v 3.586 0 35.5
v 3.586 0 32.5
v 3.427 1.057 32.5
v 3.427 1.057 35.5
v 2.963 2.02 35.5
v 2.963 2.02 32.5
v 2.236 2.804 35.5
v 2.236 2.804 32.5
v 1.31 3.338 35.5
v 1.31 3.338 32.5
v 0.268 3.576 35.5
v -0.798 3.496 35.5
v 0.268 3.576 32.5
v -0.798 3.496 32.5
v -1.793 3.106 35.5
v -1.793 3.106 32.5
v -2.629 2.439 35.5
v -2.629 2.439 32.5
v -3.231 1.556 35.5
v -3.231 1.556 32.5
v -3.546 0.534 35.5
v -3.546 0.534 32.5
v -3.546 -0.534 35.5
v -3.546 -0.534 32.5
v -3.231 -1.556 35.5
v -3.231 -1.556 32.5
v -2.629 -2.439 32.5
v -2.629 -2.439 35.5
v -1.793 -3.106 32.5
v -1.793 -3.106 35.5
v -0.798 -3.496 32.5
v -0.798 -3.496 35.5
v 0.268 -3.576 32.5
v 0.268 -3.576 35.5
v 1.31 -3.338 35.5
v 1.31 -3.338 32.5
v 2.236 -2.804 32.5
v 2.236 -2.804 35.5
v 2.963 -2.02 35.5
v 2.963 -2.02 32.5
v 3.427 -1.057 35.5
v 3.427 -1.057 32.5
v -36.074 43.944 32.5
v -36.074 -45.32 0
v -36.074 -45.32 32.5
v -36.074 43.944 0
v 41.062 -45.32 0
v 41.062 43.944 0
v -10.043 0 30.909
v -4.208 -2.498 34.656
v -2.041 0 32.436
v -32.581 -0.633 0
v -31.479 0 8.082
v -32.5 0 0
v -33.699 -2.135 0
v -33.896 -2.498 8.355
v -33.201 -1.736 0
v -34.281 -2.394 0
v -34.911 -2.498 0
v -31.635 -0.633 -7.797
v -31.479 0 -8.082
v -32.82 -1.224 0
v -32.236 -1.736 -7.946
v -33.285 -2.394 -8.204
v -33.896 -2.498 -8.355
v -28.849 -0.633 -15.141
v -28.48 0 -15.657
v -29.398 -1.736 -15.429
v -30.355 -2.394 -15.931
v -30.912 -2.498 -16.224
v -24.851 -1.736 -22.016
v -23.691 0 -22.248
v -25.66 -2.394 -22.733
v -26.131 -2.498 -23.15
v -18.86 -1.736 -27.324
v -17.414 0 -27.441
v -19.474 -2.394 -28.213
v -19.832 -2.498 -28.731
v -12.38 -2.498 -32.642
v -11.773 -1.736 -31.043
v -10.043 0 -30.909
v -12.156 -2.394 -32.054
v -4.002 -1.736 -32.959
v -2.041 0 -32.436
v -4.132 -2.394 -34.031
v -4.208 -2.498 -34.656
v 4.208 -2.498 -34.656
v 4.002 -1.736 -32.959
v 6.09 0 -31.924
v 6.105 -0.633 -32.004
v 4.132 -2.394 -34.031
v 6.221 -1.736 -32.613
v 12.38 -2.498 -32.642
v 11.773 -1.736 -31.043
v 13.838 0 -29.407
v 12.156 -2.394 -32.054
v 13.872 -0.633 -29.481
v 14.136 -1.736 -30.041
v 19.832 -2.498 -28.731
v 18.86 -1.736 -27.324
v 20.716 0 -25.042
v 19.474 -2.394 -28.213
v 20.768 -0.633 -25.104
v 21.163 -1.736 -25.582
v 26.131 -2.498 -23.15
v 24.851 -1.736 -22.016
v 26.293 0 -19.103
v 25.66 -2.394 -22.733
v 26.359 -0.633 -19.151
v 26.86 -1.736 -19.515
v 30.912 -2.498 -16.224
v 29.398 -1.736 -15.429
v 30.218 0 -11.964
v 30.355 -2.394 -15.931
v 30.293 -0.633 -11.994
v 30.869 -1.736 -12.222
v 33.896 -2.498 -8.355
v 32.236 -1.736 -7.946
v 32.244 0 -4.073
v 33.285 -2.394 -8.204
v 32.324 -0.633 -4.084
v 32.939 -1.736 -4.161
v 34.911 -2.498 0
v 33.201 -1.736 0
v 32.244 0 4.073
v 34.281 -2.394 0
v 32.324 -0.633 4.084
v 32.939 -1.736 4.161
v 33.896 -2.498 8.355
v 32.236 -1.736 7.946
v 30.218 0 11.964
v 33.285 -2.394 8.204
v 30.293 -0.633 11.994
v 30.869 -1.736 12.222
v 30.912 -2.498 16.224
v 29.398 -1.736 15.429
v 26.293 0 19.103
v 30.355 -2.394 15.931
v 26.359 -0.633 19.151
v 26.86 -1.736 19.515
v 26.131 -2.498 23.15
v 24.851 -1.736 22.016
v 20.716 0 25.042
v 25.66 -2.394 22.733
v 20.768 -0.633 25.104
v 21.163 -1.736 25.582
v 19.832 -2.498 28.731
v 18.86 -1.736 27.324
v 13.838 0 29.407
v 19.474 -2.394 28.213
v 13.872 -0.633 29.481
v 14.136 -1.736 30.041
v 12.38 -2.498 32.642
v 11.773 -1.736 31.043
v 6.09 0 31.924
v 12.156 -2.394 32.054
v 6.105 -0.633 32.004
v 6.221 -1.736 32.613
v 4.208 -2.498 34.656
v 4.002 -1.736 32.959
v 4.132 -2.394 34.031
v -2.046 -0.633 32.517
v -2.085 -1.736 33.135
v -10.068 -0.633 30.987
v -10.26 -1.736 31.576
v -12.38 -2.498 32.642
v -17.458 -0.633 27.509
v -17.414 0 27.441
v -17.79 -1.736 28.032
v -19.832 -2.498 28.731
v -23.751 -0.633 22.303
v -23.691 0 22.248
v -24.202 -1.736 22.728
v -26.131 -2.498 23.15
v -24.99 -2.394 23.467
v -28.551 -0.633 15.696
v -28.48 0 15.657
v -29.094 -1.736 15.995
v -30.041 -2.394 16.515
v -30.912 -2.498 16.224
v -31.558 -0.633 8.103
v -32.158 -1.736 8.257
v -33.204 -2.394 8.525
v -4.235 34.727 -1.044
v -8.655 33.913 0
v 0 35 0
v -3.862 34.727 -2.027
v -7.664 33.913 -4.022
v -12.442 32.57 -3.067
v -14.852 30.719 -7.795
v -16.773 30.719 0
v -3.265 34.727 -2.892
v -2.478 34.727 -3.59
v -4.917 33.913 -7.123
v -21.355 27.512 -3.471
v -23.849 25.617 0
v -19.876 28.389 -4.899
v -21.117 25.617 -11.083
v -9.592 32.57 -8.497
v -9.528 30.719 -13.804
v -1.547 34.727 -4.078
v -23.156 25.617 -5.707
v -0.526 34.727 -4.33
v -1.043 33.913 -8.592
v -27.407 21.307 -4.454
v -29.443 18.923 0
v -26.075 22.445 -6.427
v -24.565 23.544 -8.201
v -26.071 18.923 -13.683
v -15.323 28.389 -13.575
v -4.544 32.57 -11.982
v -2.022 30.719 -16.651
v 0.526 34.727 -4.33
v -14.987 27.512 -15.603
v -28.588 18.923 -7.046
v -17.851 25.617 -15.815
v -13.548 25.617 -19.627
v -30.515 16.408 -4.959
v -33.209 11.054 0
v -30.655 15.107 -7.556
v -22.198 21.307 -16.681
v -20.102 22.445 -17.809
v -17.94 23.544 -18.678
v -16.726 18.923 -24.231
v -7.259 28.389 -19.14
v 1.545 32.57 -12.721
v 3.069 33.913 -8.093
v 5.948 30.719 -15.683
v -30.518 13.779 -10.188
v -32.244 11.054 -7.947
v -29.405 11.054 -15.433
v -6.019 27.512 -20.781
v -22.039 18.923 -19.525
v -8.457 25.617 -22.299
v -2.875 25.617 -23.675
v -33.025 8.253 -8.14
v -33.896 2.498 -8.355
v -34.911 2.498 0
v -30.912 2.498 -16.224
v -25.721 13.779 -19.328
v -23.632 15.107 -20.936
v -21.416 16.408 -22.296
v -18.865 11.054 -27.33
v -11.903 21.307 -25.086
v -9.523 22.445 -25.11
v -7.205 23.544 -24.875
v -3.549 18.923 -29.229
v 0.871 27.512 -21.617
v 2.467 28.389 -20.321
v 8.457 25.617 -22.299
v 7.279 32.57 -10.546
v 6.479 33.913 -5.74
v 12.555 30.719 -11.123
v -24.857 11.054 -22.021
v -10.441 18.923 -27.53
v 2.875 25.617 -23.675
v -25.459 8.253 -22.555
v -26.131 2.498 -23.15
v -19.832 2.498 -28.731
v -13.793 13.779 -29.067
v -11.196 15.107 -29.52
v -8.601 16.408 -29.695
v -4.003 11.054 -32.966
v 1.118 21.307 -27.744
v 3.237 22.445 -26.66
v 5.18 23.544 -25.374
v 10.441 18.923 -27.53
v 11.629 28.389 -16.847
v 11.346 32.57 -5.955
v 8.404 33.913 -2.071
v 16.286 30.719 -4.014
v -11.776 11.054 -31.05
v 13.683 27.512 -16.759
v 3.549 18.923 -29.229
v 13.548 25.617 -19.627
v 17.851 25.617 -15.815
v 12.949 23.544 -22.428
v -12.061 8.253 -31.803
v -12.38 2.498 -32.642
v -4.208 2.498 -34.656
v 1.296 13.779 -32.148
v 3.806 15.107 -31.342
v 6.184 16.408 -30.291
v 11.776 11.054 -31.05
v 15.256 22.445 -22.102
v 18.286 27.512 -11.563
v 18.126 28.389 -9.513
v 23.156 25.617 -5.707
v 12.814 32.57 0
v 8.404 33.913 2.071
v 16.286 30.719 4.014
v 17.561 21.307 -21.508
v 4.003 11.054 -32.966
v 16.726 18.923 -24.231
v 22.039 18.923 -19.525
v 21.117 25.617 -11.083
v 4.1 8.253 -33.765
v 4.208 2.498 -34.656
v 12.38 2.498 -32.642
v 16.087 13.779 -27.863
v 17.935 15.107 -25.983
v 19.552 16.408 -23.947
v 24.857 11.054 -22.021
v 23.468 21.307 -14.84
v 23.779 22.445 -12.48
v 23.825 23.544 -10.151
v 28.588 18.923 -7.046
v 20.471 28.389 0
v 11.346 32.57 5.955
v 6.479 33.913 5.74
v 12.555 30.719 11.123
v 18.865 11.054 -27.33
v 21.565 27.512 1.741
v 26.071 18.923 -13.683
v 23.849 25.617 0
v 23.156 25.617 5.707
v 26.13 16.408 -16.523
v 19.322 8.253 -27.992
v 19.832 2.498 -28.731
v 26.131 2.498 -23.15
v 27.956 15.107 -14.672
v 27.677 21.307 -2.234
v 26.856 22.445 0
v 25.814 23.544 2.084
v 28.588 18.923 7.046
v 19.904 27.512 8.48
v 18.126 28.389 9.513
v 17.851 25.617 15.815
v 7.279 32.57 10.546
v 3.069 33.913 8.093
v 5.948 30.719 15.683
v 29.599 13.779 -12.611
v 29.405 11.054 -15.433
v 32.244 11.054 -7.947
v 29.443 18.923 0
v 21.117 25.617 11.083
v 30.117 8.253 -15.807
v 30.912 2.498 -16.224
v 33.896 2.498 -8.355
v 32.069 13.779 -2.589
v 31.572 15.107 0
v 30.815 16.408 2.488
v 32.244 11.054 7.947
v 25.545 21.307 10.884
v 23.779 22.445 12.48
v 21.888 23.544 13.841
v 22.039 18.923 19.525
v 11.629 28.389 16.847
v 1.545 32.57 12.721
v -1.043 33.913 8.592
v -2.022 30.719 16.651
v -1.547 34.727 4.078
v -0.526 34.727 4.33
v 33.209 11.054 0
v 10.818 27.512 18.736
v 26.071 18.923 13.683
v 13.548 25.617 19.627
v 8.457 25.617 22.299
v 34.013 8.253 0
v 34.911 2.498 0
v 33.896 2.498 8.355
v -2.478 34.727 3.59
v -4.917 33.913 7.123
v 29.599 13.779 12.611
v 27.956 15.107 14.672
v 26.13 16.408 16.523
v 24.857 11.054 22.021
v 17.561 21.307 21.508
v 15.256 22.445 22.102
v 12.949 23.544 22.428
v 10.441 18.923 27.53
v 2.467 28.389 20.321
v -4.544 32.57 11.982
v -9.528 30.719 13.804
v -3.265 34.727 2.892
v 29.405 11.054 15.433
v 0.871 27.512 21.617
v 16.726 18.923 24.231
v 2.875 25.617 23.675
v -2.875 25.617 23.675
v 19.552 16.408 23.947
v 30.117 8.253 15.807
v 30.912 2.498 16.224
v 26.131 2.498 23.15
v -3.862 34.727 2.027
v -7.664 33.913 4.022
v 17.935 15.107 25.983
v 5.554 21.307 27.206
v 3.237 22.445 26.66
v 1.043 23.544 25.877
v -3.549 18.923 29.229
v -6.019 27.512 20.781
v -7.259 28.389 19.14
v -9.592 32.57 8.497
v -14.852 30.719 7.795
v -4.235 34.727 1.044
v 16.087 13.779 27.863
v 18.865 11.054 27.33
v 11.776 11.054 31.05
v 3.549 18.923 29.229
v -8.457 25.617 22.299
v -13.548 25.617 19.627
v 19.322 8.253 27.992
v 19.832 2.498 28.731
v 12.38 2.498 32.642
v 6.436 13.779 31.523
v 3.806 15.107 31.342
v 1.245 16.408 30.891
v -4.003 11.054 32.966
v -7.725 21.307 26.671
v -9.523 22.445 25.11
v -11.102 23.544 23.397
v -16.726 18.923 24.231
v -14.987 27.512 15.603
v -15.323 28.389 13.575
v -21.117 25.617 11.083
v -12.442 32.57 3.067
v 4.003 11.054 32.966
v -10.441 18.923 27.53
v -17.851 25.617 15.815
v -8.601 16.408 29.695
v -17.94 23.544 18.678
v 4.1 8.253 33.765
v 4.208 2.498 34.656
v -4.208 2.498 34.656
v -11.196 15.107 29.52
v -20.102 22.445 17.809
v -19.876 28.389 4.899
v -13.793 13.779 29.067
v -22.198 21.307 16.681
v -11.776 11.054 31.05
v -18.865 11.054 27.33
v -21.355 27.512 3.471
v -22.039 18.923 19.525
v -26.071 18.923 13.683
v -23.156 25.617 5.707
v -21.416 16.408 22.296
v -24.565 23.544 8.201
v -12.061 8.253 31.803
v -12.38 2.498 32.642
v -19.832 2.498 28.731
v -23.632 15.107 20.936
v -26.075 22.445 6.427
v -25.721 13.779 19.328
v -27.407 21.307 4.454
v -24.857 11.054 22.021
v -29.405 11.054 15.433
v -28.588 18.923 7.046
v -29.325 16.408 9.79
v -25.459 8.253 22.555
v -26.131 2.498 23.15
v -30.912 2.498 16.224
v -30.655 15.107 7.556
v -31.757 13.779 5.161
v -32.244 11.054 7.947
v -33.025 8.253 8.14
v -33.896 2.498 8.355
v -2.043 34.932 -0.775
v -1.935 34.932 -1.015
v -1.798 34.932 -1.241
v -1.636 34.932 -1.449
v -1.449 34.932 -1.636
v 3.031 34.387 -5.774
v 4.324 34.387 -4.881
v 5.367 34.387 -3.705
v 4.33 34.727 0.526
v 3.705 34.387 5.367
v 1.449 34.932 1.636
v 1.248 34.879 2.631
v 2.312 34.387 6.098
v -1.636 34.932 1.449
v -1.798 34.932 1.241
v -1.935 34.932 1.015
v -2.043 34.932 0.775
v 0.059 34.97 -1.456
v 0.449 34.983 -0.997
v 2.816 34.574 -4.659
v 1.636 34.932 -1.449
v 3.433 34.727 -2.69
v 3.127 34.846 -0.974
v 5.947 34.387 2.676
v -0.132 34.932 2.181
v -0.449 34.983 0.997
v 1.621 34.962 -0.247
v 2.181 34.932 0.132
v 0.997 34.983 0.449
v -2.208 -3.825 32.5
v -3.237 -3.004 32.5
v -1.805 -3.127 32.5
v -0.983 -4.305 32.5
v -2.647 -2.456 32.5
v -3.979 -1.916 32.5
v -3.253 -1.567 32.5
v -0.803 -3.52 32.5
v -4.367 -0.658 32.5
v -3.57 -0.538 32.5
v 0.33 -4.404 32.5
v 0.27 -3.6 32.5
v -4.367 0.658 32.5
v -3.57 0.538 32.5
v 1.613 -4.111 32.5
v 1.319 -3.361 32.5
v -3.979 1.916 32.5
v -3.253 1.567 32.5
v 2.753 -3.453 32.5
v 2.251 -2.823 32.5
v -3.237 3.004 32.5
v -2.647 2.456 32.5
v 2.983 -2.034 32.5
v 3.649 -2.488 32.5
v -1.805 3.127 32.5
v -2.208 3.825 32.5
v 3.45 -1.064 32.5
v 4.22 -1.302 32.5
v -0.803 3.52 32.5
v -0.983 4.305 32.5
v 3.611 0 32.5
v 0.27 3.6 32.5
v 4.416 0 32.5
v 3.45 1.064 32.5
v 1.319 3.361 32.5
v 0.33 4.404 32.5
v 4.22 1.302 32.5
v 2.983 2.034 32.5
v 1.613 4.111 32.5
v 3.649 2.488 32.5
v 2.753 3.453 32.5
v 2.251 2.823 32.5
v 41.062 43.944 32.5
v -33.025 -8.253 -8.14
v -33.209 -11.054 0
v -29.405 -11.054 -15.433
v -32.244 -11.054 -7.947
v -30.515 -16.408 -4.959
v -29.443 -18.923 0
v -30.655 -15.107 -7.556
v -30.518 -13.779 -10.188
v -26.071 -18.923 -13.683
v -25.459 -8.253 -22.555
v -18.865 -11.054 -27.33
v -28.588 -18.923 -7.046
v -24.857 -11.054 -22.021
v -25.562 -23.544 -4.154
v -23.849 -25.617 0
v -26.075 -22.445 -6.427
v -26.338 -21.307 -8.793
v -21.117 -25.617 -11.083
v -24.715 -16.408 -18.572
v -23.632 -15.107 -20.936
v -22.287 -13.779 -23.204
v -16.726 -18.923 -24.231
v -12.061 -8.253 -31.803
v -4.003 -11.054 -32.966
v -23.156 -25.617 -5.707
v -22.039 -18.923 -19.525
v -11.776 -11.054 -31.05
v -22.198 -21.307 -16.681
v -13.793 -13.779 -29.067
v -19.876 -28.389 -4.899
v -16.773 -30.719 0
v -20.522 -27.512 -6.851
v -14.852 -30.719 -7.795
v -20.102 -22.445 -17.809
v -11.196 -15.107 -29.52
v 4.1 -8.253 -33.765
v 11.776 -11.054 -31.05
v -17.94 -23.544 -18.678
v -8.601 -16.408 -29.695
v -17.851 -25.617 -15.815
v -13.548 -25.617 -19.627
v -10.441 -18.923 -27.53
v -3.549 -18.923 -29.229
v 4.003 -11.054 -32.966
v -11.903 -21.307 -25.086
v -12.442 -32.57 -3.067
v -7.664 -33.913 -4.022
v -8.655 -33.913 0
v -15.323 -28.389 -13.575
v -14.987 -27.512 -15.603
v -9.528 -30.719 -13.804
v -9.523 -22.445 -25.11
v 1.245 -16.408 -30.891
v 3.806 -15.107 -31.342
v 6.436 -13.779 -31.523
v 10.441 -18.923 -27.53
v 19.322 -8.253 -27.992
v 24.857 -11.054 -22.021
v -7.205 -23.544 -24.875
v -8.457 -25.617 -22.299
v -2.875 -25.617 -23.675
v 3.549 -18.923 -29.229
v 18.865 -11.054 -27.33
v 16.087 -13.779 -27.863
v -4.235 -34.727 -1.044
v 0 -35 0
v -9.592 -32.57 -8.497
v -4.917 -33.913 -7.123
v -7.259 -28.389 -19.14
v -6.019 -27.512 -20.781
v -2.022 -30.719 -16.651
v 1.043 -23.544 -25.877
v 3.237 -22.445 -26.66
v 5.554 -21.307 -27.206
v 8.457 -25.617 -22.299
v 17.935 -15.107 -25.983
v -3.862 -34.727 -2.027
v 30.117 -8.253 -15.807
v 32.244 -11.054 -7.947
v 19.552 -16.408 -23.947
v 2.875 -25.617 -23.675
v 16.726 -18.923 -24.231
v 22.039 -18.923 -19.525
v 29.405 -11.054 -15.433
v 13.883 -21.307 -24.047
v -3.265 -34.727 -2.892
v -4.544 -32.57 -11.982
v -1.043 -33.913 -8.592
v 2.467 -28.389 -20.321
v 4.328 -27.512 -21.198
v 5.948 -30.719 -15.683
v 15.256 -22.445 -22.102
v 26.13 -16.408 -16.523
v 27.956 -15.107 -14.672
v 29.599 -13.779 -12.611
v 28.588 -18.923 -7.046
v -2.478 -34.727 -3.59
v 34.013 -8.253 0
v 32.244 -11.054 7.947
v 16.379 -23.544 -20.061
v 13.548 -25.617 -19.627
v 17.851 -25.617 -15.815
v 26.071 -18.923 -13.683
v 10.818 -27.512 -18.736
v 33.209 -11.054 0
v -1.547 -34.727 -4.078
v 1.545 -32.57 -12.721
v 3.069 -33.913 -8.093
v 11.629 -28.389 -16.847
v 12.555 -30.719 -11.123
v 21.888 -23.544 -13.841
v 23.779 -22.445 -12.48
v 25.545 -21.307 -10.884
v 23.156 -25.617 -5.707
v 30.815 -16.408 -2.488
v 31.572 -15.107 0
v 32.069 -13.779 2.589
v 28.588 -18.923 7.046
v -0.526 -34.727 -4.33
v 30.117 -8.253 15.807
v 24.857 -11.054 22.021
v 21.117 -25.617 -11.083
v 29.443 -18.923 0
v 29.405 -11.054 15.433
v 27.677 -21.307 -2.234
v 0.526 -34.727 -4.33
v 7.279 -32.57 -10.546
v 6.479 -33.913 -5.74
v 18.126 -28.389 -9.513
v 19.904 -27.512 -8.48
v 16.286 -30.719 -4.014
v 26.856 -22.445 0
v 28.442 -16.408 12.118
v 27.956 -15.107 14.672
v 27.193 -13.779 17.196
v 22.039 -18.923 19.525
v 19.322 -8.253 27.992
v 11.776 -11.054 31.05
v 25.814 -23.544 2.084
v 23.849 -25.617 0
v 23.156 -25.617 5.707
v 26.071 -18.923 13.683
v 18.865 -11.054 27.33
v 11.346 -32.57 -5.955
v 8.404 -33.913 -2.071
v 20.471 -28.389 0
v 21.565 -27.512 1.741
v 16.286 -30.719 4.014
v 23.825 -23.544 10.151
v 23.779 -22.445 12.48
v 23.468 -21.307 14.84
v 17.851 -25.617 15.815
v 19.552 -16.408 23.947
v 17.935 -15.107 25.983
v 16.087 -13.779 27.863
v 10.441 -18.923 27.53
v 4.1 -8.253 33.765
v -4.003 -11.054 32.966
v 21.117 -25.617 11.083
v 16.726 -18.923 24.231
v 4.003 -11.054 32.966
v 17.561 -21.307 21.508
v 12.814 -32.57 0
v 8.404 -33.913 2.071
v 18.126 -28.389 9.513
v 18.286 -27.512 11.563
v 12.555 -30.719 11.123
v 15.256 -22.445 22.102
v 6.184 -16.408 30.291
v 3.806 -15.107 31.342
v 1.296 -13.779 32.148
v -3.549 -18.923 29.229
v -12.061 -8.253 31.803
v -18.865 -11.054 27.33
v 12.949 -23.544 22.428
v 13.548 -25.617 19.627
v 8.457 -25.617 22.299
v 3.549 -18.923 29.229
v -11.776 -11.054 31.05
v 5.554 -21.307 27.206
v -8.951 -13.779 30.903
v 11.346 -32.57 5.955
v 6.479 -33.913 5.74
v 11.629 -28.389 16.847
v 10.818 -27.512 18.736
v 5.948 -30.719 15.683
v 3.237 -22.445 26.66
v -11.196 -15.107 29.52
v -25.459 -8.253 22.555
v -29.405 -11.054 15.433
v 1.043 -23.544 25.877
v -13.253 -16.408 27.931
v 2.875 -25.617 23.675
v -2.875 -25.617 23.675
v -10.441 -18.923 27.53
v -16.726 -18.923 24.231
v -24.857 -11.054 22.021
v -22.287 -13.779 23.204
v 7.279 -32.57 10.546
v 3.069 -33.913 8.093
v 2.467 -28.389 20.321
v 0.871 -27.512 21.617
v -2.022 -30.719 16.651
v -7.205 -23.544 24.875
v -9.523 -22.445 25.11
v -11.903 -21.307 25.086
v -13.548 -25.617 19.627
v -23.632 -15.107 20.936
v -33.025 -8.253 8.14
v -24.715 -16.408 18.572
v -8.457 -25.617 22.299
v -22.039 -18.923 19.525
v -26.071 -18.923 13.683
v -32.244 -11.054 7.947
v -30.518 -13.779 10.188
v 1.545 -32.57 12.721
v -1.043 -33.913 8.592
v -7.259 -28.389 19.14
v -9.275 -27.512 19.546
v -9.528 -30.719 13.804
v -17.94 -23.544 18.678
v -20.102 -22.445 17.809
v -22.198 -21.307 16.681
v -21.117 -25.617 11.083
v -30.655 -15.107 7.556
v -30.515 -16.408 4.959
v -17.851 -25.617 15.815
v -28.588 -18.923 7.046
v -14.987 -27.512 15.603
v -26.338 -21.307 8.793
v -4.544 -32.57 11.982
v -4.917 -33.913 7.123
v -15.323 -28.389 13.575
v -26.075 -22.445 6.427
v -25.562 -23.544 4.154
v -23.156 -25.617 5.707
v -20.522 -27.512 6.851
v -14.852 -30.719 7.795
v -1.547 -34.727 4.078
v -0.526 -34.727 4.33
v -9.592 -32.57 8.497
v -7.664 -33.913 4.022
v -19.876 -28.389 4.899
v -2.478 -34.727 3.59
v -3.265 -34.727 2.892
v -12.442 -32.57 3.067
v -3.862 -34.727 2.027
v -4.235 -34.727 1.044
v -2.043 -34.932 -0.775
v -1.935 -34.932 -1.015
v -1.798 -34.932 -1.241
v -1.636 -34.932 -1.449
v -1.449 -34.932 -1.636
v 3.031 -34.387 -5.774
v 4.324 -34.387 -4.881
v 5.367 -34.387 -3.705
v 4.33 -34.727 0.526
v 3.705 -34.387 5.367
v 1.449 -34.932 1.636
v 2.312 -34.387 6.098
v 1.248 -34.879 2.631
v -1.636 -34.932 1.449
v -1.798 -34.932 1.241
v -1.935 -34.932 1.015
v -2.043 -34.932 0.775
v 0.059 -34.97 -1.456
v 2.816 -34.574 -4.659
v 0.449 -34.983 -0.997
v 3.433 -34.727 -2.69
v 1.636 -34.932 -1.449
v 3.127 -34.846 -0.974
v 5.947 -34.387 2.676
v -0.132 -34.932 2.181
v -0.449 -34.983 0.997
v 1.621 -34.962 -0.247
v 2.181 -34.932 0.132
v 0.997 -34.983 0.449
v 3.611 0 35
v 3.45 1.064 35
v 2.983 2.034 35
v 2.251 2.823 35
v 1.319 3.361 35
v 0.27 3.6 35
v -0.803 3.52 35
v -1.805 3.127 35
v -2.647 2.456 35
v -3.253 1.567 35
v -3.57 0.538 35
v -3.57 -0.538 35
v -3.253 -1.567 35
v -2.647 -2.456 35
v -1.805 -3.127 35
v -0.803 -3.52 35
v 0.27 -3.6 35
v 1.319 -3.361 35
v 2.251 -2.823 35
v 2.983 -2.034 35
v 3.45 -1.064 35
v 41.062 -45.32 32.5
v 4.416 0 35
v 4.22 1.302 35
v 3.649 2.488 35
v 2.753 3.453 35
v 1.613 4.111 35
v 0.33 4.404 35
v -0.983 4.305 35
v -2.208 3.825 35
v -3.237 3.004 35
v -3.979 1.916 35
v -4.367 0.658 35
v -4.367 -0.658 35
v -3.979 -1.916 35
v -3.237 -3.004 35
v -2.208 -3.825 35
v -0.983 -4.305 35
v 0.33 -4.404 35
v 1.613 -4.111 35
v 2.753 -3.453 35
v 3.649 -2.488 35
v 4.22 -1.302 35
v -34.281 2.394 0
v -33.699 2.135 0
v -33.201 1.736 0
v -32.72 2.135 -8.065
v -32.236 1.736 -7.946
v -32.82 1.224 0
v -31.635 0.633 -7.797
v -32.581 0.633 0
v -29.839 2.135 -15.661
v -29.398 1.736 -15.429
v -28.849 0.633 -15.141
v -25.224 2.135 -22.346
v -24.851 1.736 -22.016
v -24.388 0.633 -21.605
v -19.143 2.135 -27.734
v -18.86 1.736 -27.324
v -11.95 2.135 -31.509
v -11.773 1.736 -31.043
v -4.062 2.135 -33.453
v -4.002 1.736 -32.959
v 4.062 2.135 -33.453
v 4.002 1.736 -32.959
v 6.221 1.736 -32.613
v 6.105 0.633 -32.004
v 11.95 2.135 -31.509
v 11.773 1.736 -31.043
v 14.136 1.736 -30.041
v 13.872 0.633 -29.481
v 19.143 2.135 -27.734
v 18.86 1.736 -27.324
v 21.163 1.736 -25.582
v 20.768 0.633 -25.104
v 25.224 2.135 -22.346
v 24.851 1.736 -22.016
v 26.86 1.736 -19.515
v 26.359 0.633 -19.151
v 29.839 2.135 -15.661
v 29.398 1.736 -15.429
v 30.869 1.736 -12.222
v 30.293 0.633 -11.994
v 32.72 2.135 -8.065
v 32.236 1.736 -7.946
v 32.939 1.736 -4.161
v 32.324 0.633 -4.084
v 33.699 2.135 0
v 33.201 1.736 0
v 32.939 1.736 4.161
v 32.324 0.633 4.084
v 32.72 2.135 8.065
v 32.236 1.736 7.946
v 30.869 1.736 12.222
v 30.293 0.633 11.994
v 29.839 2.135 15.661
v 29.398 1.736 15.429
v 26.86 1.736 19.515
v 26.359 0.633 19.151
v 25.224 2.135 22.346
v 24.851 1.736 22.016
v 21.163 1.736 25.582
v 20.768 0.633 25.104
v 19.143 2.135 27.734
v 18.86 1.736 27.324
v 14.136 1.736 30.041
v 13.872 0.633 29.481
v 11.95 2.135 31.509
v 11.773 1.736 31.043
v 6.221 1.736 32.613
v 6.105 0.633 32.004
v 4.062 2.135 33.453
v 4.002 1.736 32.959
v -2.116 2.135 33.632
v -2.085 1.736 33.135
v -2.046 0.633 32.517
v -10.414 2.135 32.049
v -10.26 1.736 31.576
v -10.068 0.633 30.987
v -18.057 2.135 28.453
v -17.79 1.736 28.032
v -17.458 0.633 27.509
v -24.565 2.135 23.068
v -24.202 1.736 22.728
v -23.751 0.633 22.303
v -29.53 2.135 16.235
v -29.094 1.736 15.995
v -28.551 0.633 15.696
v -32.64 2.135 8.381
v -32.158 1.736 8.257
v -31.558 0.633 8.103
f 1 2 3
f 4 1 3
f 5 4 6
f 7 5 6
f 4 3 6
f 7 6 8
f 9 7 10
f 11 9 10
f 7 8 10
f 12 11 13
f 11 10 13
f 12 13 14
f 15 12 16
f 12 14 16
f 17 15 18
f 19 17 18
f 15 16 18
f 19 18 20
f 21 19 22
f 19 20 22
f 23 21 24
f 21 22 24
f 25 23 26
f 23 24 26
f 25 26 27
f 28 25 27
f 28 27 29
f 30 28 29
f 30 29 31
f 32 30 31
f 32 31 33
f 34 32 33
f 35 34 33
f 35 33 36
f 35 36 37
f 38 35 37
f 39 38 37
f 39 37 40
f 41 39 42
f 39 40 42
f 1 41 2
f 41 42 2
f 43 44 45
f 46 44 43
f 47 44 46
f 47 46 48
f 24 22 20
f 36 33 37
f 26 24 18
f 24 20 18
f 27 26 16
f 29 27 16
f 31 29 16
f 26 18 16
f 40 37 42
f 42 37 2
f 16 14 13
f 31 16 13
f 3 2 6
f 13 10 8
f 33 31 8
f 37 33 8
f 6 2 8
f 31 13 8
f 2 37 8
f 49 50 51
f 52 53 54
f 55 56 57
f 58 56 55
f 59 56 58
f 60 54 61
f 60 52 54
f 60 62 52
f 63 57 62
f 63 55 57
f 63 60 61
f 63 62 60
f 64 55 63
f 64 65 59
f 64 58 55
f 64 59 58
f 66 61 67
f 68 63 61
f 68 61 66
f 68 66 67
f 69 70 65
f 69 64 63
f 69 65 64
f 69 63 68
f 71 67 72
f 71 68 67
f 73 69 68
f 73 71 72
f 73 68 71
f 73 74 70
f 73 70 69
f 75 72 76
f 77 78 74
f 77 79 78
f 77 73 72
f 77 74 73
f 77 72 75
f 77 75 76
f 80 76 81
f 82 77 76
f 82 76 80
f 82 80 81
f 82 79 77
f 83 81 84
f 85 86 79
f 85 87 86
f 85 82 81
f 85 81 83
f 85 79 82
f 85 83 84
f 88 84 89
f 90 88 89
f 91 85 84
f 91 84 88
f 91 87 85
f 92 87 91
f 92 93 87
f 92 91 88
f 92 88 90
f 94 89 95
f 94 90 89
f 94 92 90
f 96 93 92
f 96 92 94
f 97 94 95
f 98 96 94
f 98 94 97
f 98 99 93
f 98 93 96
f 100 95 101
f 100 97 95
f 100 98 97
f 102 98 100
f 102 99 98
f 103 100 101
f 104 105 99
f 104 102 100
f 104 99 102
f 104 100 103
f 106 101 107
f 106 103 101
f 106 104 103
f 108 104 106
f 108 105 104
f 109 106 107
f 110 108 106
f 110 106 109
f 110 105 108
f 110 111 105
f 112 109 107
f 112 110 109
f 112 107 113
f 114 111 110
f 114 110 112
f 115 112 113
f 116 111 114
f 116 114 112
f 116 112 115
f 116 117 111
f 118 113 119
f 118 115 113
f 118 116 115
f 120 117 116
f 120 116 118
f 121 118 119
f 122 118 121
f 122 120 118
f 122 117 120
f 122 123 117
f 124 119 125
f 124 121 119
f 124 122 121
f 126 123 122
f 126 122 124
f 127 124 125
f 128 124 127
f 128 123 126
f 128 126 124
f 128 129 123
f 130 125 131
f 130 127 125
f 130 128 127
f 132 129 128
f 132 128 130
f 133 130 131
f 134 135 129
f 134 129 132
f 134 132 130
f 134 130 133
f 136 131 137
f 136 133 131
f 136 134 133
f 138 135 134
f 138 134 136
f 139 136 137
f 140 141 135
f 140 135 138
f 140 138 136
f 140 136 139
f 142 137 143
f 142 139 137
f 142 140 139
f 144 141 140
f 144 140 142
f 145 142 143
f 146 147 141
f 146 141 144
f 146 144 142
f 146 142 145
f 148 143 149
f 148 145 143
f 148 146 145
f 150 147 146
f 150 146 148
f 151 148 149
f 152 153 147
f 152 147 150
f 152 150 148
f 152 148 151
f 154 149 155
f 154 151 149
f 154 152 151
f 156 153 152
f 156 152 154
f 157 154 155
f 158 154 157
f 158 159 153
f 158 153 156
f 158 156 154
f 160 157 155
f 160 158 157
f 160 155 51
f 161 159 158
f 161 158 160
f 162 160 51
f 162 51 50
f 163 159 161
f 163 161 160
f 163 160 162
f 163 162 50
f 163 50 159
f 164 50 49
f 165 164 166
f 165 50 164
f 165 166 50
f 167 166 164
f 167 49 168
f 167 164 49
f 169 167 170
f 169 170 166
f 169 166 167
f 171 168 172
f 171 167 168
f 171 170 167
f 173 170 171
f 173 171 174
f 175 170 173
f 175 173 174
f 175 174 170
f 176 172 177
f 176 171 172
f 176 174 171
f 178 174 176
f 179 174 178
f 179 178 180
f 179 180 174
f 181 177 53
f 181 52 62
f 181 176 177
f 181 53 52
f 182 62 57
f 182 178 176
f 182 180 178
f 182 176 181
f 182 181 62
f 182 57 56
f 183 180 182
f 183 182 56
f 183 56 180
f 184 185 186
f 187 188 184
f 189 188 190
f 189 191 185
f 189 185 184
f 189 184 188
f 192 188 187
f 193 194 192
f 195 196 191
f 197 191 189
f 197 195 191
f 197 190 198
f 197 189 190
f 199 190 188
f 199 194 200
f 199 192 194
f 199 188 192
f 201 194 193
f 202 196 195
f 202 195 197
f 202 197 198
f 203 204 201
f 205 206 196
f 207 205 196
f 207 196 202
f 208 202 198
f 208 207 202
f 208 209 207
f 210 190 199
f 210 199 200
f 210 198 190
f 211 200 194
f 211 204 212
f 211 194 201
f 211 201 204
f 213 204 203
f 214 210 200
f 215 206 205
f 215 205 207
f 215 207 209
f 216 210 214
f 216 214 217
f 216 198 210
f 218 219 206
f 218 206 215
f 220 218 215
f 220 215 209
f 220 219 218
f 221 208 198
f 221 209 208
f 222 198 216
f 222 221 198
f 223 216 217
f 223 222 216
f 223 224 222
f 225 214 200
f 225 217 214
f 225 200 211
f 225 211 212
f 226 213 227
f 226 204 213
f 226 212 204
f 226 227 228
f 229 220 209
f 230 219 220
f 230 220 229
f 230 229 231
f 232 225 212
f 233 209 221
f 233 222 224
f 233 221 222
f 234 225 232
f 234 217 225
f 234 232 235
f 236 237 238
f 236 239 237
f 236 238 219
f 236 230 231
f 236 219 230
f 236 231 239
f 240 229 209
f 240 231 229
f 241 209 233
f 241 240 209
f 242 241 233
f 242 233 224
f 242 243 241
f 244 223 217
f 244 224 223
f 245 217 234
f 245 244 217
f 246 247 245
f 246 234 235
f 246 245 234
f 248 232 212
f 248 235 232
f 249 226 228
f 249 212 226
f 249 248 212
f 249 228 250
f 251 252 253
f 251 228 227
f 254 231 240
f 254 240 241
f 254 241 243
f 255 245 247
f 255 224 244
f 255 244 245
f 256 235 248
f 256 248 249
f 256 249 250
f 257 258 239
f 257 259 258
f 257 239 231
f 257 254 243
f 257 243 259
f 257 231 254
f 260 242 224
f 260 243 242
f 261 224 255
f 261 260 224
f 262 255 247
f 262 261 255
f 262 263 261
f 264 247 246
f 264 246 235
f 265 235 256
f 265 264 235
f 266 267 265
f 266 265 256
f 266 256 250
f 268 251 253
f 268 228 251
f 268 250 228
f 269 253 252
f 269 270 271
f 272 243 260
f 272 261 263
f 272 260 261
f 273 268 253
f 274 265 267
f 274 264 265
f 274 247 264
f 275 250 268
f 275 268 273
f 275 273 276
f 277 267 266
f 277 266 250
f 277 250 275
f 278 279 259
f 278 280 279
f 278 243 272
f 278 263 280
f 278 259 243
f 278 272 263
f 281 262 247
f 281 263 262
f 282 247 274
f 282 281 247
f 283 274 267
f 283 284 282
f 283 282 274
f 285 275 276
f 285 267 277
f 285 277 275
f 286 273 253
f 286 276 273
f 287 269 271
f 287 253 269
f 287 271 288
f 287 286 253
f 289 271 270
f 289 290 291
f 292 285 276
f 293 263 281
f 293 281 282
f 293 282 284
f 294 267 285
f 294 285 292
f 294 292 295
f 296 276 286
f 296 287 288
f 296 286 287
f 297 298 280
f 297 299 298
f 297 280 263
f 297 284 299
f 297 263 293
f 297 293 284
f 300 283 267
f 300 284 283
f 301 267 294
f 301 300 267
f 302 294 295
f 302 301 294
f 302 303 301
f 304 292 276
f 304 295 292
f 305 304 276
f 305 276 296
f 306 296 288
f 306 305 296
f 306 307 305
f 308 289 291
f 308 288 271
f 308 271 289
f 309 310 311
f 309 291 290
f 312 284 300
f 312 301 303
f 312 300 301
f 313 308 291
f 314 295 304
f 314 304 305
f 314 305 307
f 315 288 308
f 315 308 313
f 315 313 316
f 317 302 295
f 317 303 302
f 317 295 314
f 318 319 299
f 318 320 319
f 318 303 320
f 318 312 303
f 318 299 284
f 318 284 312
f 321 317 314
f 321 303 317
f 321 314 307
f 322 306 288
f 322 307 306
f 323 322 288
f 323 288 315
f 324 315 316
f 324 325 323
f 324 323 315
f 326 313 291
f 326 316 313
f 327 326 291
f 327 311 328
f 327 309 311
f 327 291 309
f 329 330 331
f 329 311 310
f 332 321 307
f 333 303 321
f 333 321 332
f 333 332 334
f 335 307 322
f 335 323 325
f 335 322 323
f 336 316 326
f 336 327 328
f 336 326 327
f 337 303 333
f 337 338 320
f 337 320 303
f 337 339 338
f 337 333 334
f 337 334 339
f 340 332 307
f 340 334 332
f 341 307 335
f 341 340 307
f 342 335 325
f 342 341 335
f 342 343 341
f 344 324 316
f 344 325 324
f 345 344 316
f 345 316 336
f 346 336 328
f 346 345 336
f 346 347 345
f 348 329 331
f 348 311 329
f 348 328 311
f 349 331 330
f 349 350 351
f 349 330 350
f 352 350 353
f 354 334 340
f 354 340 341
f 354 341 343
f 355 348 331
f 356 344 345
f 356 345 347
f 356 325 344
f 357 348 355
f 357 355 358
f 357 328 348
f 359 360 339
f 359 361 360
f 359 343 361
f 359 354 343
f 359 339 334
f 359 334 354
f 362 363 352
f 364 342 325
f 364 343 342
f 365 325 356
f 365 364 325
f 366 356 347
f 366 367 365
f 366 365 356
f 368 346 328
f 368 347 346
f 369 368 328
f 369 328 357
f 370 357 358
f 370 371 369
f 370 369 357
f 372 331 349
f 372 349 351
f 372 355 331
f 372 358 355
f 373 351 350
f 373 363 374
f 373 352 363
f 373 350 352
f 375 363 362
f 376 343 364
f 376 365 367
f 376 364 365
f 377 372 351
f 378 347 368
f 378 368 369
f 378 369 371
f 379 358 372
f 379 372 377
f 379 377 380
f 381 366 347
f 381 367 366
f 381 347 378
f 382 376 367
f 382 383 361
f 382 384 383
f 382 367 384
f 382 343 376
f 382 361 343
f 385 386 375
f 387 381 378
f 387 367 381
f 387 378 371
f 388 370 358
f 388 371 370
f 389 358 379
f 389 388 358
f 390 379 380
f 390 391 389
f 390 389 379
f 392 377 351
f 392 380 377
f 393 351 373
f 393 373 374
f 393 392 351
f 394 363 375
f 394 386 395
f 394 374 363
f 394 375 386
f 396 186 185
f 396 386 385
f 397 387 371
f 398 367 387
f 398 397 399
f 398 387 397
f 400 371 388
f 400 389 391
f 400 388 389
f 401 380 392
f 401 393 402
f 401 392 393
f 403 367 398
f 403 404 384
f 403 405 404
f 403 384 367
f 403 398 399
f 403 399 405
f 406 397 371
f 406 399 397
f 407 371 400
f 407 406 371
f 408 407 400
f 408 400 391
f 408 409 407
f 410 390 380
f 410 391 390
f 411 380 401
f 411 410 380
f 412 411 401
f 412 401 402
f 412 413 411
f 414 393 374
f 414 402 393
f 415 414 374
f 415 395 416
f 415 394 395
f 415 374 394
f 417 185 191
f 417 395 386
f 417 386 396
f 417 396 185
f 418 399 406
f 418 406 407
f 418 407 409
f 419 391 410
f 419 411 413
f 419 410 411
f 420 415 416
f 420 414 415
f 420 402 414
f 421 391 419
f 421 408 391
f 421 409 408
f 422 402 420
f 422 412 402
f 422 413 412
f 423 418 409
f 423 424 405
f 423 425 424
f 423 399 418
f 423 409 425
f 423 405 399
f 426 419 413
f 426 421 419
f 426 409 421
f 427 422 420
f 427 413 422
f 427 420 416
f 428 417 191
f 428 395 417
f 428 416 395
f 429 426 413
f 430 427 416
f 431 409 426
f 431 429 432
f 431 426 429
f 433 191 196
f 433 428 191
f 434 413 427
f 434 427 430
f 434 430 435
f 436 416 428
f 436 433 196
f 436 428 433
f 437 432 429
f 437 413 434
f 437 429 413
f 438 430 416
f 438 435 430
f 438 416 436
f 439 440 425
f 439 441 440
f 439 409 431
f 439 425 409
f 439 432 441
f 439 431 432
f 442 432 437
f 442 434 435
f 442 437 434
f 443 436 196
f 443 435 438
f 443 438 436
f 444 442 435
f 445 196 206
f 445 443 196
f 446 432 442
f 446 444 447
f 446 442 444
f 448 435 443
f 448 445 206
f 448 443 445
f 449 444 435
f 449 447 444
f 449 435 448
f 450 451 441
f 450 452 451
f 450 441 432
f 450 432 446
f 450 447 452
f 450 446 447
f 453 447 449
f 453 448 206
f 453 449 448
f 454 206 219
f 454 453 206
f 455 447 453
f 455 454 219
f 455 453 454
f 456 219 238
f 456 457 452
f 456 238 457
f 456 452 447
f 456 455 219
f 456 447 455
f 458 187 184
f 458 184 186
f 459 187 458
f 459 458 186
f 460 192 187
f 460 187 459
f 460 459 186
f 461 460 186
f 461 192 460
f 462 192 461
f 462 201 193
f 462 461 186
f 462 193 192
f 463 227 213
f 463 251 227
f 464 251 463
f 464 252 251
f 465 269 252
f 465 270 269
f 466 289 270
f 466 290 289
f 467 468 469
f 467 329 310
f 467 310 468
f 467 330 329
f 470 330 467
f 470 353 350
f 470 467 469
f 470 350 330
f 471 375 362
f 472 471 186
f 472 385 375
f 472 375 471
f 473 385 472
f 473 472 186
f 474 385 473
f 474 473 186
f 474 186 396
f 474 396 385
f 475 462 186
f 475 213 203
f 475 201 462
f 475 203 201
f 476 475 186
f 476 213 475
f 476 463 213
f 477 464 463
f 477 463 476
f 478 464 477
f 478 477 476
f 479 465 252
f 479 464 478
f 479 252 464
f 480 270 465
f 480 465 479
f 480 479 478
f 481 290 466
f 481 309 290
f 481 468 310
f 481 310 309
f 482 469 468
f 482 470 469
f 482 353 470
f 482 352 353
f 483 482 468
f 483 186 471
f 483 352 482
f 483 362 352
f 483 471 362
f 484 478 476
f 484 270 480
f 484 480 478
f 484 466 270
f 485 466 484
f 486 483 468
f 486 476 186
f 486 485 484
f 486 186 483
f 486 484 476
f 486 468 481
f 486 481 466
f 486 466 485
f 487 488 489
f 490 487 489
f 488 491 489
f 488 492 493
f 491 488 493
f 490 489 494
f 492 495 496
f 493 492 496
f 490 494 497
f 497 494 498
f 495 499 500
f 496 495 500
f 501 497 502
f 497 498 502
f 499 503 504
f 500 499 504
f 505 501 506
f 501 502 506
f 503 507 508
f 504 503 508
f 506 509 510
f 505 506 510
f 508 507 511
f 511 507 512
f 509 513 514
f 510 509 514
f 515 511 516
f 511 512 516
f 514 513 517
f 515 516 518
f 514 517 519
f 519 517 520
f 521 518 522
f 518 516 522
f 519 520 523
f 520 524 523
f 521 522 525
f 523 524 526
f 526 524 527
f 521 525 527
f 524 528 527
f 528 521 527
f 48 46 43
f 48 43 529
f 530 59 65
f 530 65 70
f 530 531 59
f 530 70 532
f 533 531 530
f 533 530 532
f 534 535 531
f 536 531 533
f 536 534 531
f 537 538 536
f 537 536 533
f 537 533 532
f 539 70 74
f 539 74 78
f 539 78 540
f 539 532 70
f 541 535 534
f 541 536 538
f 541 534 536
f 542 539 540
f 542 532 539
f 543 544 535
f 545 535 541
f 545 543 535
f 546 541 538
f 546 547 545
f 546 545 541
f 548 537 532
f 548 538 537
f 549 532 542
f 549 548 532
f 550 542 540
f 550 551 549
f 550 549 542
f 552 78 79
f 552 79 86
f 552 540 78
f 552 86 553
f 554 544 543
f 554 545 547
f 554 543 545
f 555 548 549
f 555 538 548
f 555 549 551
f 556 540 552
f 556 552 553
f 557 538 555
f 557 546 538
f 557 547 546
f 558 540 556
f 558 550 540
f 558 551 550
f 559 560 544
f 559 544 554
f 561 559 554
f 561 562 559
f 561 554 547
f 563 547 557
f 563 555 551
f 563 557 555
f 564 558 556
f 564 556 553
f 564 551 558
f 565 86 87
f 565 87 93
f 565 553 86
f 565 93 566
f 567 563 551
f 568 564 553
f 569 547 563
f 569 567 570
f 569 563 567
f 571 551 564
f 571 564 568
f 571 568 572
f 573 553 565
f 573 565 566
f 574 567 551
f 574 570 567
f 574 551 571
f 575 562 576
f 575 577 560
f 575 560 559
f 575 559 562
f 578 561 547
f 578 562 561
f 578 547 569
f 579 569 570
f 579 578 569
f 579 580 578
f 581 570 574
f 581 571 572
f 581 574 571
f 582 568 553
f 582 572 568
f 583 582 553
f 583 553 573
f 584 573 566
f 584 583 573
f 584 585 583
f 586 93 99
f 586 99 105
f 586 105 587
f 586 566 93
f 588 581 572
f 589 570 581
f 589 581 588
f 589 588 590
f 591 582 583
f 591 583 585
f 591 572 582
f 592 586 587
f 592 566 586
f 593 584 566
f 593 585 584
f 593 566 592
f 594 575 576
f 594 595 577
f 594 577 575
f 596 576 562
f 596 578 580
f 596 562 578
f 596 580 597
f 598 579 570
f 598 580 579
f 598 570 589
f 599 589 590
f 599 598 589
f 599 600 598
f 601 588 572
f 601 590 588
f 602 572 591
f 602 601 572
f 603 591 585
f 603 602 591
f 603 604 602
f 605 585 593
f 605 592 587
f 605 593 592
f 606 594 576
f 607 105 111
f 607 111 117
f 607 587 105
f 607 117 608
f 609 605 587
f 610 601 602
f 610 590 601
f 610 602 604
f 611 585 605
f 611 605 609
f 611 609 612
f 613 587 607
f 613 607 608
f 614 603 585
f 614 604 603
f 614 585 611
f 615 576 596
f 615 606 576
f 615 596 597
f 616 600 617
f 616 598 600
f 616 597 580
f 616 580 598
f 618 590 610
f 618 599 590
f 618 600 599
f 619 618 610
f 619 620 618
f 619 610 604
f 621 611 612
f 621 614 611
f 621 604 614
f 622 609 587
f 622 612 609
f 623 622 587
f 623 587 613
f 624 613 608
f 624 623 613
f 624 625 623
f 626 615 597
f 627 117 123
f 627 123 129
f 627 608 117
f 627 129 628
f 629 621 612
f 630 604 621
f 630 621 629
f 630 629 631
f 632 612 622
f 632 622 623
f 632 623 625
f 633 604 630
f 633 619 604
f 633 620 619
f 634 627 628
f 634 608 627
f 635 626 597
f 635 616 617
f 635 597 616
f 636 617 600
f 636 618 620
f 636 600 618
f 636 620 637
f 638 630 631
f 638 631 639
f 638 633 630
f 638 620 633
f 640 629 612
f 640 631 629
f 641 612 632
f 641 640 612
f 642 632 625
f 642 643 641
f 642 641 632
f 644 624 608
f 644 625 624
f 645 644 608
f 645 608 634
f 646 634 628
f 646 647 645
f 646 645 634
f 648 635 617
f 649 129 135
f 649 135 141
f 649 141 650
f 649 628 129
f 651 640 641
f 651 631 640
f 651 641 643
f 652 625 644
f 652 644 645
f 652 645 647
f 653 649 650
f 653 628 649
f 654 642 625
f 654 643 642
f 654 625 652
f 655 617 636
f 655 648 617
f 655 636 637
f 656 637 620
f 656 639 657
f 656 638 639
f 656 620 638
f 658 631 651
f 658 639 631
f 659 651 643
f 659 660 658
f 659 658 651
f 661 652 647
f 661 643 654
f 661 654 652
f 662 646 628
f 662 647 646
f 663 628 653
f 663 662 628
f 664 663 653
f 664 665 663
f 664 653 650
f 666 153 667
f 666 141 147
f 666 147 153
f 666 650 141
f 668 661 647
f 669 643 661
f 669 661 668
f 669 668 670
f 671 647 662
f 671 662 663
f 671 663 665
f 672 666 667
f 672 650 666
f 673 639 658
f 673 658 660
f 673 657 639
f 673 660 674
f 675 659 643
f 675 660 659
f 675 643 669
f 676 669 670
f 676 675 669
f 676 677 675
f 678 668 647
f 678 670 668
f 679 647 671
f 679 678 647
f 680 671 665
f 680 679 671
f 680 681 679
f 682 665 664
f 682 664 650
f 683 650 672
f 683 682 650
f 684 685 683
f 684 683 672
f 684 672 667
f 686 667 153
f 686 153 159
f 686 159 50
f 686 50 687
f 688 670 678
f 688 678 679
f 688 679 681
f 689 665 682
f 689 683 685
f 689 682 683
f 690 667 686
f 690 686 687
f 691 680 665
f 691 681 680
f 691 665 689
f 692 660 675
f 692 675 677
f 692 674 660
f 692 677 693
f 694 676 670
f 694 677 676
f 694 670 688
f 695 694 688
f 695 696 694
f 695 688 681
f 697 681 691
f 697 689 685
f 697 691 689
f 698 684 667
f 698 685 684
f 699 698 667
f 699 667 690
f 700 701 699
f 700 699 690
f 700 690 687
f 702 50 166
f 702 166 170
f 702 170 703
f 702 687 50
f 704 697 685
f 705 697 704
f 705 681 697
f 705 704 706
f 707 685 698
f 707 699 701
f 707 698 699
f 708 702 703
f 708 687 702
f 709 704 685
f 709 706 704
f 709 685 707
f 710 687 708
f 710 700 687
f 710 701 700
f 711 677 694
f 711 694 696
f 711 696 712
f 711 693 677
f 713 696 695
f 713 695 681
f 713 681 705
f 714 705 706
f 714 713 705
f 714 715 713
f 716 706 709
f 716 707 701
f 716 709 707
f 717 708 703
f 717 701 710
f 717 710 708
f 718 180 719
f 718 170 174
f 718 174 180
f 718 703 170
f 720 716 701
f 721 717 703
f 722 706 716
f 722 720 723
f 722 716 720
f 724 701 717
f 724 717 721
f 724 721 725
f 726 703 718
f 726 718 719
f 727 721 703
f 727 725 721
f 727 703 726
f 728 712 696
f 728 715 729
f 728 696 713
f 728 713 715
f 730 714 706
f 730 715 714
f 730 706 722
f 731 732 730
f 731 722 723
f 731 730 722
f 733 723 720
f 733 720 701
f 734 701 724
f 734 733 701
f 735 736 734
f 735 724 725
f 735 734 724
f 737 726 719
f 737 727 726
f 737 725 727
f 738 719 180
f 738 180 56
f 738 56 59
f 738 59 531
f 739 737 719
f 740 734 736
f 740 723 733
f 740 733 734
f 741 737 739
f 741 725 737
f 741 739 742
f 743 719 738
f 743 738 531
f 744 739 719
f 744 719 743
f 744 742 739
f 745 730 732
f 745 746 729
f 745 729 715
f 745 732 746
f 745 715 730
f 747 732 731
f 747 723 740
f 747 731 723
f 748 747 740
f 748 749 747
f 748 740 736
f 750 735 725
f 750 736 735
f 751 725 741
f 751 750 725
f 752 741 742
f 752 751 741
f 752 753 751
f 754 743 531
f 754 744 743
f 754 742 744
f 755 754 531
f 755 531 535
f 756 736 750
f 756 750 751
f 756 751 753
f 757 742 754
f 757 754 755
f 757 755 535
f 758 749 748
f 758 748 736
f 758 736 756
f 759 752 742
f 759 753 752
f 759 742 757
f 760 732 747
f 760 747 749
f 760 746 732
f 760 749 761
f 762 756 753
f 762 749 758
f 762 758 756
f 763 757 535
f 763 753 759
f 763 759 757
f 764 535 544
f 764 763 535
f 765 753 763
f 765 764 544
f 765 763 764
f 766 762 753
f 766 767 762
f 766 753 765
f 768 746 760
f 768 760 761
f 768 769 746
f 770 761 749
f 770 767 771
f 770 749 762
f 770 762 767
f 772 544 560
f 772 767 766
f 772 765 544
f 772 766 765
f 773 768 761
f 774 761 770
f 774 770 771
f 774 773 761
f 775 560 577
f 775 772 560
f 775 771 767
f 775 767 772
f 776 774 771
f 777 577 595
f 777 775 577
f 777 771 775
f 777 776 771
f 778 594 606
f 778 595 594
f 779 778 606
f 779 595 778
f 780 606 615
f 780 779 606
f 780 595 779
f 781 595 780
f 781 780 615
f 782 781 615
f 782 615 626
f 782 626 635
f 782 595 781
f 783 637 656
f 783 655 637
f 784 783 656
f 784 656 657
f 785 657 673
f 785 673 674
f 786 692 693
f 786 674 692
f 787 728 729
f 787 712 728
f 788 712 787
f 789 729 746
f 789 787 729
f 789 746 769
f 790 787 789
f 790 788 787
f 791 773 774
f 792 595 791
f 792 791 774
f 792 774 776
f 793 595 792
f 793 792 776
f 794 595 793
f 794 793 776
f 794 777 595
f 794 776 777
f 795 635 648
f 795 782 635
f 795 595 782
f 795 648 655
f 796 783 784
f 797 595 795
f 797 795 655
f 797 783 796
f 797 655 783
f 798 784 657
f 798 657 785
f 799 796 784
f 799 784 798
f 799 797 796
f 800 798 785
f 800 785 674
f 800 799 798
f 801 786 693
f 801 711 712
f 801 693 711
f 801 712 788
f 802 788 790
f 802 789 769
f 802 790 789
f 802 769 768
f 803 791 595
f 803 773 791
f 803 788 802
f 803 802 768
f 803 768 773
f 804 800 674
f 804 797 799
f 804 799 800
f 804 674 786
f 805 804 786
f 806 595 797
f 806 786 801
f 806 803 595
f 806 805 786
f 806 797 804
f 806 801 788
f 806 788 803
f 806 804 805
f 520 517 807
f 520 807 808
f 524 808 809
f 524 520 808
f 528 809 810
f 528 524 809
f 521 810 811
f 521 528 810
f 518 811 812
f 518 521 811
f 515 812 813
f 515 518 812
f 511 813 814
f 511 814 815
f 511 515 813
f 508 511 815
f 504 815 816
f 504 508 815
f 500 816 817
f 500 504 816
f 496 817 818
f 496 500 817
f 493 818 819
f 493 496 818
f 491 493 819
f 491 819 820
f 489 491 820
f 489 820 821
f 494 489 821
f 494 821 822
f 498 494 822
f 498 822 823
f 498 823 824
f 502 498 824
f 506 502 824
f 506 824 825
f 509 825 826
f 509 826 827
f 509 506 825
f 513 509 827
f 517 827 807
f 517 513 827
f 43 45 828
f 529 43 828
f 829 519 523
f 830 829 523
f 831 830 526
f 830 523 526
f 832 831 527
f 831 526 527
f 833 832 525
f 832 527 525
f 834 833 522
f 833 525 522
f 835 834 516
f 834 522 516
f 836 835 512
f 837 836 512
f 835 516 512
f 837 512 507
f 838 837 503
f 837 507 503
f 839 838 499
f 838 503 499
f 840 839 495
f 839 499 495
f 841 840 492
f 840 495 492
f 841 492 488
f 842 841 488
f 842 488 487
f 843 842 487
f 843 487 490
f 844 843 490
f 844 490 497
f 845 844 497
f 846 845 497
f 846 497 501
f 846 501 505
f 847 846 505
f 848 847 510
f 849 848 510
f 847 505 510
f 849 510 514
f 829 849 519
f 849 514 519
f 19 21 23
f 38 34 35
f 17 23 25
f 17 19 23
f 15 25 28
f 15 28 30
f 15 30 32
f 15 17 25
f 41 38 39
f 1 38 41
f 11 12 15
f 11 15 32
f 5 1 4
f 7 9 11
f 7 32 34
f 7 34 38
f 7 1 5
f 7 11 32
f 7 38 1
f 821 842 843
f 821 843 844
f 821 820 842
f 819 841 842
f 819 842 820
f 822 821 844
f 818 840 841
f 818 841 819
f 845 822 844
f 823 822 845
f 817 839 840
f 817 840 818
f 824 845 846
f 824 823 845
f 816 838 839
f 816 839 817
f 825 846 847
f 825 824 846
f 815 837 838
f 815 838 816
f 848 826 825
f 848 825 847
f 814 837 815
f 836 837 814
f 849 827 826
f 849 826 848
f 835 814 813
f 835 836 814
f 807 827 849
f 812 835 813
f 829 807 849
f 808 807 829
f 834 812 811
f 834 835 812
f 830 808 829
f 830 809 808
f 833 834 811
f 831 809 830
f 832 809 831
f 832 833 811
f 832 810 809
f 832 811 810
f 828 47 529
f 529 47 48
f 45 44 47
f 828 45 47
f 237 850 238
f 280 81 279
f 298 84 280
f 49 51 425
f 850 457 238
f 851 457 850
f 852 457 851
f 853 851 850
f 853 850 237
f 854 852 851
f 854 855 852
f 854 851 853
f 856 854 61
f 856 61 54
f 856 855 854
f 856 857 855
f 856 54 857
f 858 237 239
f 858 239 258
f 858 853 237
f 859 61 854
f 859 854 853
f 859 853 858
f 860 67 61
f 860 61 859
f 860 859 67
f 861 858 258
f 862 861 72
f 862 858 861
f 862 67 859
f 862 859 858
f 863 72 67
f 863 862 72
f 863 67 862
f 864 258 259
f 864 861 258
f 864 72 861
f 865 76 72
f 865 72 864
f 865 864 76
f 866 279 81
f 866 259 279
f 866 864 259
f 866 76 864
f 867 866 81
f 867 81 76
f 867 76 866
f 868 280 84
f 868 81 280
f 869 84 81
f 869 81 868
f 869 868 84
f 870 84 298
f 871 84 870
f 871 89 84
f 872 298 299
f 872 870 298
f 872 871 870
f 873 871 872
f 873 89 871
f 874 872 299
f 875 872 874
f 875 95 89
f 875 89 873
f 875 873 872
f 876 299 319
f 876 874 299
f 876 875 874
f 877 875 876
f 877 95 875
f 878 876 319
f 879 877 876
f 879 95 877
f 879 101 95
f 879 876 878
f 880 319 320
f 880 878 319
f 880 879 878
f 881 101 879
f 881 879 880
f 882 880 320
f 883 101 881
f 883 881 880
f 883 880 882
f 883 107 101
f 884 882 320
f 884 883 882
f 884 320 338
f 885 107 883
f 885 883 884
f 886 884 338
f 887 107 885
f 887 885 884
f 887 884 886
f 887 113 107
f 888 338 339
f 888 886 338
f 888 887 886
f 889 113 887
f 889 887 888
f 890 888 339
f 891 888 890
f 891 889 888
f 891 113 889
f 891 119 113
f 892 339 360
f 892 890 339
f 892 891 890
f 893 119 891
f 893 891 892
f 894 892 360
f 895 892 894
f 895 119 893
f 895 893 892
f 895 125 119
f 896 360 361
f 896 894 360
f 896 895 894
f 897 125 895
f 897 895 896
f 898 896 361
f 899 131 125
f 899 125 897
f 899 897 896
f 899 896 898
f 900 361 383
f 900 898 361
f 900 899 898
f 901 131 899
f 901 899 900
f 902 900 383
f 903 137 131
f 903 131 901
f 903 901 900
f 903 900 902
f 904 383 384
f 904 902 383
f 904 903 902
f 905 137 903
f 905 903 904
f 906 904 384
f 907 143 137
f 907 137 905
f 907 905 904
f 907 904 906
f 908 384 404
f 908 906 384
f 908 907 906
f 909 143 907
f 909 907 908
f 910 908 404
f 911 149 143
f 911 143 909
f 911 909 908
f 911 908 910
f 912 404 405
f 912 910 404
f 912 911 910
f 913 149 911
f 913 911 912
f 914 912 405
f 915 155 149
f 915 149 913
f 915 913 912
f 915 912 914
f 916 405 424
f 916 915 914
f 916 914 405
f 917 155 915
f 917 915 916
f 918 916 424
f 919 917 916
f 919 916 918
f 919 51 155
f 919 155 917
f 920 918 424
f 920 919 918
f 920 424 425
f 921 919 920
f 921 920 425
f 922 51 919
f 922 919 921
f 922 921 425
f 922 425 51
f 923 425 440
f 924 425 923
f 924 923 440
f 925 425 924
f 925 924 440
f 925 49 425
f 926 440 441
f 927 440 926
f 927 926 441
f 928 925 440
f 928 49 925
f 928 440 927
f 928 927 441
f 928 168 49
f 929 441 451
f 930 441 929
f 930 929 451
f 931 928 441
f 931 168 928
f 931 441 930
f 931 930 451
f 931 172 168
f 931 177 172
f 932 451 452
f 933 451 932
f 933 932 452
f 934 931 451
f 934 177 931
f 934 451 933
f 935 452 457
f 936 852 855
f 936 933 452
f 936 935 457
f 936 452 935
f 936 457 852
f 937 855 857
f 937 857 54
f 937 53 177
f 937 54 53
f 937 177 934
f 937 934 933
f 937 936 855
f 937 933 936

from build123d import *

# Parameters (mm, degrees)
F2_W     = 77.136081
F2_H     = 89.264393
F3_DEPTH = 32.5
F4_R     = 4.416171
F4_R_2   = 3.610503
F6_DEPTH = 2.5
F5_R     = 3.586062
F7_DEPTH = 3


with BuildPart() as f1:
    # F0 (on Top) → F1 (revolve)
    with BuildSketch(Plane.XY):
        with BuildLine():
            Line((0, -35), (0, 35))
            ThreePointArc((0, 35), (-23.849065, 25.616832), (-34.910714, 2.498405))
            ThreePointArc((-34.910714, 2.498405), (-33.200943, 1.735913), (-32.5, 0))
            ThreePointArc((-32.5, 0), (-33.200943, -1.735913), (-34.910714, -2.498405))
            ThreePointArc((-34.910714, -2.498405), (-23.849065, -25.616832), (0, -35))
        make_face()
    revolve(axis=Axis((0, 0, 0), (0, -1, 0)))


with BuildPart() as f3:
    # F2 (on Top) → F3 (new body)
    with BuildSketch(Plane.XY):
        with Locations((2.494181, -0.68779)):
            Rectangle(F2_W, F2_H)
    extrude(amount=F3_DEPTH)


with BuildPart() as f6:
    # F4 (on face) → F6 (new body)
    with BuildSketch(Plane.XY.offset(32.5)):
        Circle(F4_R)
        Circle(F4_R_2, mode=Mode.SUBTRACT)
    extrude(amount=F6_DEPTH)


with BuildPart() as f7:
    # F5 (on face) → F7 (new body)
    with BuildSketch(Plane.XY.offset(32.5)):
        Circle(F5_R)
    extrude(amount=F7_DEPTH)


solid = Compound([f1.part, f3.part, f6.part, f7.part])
